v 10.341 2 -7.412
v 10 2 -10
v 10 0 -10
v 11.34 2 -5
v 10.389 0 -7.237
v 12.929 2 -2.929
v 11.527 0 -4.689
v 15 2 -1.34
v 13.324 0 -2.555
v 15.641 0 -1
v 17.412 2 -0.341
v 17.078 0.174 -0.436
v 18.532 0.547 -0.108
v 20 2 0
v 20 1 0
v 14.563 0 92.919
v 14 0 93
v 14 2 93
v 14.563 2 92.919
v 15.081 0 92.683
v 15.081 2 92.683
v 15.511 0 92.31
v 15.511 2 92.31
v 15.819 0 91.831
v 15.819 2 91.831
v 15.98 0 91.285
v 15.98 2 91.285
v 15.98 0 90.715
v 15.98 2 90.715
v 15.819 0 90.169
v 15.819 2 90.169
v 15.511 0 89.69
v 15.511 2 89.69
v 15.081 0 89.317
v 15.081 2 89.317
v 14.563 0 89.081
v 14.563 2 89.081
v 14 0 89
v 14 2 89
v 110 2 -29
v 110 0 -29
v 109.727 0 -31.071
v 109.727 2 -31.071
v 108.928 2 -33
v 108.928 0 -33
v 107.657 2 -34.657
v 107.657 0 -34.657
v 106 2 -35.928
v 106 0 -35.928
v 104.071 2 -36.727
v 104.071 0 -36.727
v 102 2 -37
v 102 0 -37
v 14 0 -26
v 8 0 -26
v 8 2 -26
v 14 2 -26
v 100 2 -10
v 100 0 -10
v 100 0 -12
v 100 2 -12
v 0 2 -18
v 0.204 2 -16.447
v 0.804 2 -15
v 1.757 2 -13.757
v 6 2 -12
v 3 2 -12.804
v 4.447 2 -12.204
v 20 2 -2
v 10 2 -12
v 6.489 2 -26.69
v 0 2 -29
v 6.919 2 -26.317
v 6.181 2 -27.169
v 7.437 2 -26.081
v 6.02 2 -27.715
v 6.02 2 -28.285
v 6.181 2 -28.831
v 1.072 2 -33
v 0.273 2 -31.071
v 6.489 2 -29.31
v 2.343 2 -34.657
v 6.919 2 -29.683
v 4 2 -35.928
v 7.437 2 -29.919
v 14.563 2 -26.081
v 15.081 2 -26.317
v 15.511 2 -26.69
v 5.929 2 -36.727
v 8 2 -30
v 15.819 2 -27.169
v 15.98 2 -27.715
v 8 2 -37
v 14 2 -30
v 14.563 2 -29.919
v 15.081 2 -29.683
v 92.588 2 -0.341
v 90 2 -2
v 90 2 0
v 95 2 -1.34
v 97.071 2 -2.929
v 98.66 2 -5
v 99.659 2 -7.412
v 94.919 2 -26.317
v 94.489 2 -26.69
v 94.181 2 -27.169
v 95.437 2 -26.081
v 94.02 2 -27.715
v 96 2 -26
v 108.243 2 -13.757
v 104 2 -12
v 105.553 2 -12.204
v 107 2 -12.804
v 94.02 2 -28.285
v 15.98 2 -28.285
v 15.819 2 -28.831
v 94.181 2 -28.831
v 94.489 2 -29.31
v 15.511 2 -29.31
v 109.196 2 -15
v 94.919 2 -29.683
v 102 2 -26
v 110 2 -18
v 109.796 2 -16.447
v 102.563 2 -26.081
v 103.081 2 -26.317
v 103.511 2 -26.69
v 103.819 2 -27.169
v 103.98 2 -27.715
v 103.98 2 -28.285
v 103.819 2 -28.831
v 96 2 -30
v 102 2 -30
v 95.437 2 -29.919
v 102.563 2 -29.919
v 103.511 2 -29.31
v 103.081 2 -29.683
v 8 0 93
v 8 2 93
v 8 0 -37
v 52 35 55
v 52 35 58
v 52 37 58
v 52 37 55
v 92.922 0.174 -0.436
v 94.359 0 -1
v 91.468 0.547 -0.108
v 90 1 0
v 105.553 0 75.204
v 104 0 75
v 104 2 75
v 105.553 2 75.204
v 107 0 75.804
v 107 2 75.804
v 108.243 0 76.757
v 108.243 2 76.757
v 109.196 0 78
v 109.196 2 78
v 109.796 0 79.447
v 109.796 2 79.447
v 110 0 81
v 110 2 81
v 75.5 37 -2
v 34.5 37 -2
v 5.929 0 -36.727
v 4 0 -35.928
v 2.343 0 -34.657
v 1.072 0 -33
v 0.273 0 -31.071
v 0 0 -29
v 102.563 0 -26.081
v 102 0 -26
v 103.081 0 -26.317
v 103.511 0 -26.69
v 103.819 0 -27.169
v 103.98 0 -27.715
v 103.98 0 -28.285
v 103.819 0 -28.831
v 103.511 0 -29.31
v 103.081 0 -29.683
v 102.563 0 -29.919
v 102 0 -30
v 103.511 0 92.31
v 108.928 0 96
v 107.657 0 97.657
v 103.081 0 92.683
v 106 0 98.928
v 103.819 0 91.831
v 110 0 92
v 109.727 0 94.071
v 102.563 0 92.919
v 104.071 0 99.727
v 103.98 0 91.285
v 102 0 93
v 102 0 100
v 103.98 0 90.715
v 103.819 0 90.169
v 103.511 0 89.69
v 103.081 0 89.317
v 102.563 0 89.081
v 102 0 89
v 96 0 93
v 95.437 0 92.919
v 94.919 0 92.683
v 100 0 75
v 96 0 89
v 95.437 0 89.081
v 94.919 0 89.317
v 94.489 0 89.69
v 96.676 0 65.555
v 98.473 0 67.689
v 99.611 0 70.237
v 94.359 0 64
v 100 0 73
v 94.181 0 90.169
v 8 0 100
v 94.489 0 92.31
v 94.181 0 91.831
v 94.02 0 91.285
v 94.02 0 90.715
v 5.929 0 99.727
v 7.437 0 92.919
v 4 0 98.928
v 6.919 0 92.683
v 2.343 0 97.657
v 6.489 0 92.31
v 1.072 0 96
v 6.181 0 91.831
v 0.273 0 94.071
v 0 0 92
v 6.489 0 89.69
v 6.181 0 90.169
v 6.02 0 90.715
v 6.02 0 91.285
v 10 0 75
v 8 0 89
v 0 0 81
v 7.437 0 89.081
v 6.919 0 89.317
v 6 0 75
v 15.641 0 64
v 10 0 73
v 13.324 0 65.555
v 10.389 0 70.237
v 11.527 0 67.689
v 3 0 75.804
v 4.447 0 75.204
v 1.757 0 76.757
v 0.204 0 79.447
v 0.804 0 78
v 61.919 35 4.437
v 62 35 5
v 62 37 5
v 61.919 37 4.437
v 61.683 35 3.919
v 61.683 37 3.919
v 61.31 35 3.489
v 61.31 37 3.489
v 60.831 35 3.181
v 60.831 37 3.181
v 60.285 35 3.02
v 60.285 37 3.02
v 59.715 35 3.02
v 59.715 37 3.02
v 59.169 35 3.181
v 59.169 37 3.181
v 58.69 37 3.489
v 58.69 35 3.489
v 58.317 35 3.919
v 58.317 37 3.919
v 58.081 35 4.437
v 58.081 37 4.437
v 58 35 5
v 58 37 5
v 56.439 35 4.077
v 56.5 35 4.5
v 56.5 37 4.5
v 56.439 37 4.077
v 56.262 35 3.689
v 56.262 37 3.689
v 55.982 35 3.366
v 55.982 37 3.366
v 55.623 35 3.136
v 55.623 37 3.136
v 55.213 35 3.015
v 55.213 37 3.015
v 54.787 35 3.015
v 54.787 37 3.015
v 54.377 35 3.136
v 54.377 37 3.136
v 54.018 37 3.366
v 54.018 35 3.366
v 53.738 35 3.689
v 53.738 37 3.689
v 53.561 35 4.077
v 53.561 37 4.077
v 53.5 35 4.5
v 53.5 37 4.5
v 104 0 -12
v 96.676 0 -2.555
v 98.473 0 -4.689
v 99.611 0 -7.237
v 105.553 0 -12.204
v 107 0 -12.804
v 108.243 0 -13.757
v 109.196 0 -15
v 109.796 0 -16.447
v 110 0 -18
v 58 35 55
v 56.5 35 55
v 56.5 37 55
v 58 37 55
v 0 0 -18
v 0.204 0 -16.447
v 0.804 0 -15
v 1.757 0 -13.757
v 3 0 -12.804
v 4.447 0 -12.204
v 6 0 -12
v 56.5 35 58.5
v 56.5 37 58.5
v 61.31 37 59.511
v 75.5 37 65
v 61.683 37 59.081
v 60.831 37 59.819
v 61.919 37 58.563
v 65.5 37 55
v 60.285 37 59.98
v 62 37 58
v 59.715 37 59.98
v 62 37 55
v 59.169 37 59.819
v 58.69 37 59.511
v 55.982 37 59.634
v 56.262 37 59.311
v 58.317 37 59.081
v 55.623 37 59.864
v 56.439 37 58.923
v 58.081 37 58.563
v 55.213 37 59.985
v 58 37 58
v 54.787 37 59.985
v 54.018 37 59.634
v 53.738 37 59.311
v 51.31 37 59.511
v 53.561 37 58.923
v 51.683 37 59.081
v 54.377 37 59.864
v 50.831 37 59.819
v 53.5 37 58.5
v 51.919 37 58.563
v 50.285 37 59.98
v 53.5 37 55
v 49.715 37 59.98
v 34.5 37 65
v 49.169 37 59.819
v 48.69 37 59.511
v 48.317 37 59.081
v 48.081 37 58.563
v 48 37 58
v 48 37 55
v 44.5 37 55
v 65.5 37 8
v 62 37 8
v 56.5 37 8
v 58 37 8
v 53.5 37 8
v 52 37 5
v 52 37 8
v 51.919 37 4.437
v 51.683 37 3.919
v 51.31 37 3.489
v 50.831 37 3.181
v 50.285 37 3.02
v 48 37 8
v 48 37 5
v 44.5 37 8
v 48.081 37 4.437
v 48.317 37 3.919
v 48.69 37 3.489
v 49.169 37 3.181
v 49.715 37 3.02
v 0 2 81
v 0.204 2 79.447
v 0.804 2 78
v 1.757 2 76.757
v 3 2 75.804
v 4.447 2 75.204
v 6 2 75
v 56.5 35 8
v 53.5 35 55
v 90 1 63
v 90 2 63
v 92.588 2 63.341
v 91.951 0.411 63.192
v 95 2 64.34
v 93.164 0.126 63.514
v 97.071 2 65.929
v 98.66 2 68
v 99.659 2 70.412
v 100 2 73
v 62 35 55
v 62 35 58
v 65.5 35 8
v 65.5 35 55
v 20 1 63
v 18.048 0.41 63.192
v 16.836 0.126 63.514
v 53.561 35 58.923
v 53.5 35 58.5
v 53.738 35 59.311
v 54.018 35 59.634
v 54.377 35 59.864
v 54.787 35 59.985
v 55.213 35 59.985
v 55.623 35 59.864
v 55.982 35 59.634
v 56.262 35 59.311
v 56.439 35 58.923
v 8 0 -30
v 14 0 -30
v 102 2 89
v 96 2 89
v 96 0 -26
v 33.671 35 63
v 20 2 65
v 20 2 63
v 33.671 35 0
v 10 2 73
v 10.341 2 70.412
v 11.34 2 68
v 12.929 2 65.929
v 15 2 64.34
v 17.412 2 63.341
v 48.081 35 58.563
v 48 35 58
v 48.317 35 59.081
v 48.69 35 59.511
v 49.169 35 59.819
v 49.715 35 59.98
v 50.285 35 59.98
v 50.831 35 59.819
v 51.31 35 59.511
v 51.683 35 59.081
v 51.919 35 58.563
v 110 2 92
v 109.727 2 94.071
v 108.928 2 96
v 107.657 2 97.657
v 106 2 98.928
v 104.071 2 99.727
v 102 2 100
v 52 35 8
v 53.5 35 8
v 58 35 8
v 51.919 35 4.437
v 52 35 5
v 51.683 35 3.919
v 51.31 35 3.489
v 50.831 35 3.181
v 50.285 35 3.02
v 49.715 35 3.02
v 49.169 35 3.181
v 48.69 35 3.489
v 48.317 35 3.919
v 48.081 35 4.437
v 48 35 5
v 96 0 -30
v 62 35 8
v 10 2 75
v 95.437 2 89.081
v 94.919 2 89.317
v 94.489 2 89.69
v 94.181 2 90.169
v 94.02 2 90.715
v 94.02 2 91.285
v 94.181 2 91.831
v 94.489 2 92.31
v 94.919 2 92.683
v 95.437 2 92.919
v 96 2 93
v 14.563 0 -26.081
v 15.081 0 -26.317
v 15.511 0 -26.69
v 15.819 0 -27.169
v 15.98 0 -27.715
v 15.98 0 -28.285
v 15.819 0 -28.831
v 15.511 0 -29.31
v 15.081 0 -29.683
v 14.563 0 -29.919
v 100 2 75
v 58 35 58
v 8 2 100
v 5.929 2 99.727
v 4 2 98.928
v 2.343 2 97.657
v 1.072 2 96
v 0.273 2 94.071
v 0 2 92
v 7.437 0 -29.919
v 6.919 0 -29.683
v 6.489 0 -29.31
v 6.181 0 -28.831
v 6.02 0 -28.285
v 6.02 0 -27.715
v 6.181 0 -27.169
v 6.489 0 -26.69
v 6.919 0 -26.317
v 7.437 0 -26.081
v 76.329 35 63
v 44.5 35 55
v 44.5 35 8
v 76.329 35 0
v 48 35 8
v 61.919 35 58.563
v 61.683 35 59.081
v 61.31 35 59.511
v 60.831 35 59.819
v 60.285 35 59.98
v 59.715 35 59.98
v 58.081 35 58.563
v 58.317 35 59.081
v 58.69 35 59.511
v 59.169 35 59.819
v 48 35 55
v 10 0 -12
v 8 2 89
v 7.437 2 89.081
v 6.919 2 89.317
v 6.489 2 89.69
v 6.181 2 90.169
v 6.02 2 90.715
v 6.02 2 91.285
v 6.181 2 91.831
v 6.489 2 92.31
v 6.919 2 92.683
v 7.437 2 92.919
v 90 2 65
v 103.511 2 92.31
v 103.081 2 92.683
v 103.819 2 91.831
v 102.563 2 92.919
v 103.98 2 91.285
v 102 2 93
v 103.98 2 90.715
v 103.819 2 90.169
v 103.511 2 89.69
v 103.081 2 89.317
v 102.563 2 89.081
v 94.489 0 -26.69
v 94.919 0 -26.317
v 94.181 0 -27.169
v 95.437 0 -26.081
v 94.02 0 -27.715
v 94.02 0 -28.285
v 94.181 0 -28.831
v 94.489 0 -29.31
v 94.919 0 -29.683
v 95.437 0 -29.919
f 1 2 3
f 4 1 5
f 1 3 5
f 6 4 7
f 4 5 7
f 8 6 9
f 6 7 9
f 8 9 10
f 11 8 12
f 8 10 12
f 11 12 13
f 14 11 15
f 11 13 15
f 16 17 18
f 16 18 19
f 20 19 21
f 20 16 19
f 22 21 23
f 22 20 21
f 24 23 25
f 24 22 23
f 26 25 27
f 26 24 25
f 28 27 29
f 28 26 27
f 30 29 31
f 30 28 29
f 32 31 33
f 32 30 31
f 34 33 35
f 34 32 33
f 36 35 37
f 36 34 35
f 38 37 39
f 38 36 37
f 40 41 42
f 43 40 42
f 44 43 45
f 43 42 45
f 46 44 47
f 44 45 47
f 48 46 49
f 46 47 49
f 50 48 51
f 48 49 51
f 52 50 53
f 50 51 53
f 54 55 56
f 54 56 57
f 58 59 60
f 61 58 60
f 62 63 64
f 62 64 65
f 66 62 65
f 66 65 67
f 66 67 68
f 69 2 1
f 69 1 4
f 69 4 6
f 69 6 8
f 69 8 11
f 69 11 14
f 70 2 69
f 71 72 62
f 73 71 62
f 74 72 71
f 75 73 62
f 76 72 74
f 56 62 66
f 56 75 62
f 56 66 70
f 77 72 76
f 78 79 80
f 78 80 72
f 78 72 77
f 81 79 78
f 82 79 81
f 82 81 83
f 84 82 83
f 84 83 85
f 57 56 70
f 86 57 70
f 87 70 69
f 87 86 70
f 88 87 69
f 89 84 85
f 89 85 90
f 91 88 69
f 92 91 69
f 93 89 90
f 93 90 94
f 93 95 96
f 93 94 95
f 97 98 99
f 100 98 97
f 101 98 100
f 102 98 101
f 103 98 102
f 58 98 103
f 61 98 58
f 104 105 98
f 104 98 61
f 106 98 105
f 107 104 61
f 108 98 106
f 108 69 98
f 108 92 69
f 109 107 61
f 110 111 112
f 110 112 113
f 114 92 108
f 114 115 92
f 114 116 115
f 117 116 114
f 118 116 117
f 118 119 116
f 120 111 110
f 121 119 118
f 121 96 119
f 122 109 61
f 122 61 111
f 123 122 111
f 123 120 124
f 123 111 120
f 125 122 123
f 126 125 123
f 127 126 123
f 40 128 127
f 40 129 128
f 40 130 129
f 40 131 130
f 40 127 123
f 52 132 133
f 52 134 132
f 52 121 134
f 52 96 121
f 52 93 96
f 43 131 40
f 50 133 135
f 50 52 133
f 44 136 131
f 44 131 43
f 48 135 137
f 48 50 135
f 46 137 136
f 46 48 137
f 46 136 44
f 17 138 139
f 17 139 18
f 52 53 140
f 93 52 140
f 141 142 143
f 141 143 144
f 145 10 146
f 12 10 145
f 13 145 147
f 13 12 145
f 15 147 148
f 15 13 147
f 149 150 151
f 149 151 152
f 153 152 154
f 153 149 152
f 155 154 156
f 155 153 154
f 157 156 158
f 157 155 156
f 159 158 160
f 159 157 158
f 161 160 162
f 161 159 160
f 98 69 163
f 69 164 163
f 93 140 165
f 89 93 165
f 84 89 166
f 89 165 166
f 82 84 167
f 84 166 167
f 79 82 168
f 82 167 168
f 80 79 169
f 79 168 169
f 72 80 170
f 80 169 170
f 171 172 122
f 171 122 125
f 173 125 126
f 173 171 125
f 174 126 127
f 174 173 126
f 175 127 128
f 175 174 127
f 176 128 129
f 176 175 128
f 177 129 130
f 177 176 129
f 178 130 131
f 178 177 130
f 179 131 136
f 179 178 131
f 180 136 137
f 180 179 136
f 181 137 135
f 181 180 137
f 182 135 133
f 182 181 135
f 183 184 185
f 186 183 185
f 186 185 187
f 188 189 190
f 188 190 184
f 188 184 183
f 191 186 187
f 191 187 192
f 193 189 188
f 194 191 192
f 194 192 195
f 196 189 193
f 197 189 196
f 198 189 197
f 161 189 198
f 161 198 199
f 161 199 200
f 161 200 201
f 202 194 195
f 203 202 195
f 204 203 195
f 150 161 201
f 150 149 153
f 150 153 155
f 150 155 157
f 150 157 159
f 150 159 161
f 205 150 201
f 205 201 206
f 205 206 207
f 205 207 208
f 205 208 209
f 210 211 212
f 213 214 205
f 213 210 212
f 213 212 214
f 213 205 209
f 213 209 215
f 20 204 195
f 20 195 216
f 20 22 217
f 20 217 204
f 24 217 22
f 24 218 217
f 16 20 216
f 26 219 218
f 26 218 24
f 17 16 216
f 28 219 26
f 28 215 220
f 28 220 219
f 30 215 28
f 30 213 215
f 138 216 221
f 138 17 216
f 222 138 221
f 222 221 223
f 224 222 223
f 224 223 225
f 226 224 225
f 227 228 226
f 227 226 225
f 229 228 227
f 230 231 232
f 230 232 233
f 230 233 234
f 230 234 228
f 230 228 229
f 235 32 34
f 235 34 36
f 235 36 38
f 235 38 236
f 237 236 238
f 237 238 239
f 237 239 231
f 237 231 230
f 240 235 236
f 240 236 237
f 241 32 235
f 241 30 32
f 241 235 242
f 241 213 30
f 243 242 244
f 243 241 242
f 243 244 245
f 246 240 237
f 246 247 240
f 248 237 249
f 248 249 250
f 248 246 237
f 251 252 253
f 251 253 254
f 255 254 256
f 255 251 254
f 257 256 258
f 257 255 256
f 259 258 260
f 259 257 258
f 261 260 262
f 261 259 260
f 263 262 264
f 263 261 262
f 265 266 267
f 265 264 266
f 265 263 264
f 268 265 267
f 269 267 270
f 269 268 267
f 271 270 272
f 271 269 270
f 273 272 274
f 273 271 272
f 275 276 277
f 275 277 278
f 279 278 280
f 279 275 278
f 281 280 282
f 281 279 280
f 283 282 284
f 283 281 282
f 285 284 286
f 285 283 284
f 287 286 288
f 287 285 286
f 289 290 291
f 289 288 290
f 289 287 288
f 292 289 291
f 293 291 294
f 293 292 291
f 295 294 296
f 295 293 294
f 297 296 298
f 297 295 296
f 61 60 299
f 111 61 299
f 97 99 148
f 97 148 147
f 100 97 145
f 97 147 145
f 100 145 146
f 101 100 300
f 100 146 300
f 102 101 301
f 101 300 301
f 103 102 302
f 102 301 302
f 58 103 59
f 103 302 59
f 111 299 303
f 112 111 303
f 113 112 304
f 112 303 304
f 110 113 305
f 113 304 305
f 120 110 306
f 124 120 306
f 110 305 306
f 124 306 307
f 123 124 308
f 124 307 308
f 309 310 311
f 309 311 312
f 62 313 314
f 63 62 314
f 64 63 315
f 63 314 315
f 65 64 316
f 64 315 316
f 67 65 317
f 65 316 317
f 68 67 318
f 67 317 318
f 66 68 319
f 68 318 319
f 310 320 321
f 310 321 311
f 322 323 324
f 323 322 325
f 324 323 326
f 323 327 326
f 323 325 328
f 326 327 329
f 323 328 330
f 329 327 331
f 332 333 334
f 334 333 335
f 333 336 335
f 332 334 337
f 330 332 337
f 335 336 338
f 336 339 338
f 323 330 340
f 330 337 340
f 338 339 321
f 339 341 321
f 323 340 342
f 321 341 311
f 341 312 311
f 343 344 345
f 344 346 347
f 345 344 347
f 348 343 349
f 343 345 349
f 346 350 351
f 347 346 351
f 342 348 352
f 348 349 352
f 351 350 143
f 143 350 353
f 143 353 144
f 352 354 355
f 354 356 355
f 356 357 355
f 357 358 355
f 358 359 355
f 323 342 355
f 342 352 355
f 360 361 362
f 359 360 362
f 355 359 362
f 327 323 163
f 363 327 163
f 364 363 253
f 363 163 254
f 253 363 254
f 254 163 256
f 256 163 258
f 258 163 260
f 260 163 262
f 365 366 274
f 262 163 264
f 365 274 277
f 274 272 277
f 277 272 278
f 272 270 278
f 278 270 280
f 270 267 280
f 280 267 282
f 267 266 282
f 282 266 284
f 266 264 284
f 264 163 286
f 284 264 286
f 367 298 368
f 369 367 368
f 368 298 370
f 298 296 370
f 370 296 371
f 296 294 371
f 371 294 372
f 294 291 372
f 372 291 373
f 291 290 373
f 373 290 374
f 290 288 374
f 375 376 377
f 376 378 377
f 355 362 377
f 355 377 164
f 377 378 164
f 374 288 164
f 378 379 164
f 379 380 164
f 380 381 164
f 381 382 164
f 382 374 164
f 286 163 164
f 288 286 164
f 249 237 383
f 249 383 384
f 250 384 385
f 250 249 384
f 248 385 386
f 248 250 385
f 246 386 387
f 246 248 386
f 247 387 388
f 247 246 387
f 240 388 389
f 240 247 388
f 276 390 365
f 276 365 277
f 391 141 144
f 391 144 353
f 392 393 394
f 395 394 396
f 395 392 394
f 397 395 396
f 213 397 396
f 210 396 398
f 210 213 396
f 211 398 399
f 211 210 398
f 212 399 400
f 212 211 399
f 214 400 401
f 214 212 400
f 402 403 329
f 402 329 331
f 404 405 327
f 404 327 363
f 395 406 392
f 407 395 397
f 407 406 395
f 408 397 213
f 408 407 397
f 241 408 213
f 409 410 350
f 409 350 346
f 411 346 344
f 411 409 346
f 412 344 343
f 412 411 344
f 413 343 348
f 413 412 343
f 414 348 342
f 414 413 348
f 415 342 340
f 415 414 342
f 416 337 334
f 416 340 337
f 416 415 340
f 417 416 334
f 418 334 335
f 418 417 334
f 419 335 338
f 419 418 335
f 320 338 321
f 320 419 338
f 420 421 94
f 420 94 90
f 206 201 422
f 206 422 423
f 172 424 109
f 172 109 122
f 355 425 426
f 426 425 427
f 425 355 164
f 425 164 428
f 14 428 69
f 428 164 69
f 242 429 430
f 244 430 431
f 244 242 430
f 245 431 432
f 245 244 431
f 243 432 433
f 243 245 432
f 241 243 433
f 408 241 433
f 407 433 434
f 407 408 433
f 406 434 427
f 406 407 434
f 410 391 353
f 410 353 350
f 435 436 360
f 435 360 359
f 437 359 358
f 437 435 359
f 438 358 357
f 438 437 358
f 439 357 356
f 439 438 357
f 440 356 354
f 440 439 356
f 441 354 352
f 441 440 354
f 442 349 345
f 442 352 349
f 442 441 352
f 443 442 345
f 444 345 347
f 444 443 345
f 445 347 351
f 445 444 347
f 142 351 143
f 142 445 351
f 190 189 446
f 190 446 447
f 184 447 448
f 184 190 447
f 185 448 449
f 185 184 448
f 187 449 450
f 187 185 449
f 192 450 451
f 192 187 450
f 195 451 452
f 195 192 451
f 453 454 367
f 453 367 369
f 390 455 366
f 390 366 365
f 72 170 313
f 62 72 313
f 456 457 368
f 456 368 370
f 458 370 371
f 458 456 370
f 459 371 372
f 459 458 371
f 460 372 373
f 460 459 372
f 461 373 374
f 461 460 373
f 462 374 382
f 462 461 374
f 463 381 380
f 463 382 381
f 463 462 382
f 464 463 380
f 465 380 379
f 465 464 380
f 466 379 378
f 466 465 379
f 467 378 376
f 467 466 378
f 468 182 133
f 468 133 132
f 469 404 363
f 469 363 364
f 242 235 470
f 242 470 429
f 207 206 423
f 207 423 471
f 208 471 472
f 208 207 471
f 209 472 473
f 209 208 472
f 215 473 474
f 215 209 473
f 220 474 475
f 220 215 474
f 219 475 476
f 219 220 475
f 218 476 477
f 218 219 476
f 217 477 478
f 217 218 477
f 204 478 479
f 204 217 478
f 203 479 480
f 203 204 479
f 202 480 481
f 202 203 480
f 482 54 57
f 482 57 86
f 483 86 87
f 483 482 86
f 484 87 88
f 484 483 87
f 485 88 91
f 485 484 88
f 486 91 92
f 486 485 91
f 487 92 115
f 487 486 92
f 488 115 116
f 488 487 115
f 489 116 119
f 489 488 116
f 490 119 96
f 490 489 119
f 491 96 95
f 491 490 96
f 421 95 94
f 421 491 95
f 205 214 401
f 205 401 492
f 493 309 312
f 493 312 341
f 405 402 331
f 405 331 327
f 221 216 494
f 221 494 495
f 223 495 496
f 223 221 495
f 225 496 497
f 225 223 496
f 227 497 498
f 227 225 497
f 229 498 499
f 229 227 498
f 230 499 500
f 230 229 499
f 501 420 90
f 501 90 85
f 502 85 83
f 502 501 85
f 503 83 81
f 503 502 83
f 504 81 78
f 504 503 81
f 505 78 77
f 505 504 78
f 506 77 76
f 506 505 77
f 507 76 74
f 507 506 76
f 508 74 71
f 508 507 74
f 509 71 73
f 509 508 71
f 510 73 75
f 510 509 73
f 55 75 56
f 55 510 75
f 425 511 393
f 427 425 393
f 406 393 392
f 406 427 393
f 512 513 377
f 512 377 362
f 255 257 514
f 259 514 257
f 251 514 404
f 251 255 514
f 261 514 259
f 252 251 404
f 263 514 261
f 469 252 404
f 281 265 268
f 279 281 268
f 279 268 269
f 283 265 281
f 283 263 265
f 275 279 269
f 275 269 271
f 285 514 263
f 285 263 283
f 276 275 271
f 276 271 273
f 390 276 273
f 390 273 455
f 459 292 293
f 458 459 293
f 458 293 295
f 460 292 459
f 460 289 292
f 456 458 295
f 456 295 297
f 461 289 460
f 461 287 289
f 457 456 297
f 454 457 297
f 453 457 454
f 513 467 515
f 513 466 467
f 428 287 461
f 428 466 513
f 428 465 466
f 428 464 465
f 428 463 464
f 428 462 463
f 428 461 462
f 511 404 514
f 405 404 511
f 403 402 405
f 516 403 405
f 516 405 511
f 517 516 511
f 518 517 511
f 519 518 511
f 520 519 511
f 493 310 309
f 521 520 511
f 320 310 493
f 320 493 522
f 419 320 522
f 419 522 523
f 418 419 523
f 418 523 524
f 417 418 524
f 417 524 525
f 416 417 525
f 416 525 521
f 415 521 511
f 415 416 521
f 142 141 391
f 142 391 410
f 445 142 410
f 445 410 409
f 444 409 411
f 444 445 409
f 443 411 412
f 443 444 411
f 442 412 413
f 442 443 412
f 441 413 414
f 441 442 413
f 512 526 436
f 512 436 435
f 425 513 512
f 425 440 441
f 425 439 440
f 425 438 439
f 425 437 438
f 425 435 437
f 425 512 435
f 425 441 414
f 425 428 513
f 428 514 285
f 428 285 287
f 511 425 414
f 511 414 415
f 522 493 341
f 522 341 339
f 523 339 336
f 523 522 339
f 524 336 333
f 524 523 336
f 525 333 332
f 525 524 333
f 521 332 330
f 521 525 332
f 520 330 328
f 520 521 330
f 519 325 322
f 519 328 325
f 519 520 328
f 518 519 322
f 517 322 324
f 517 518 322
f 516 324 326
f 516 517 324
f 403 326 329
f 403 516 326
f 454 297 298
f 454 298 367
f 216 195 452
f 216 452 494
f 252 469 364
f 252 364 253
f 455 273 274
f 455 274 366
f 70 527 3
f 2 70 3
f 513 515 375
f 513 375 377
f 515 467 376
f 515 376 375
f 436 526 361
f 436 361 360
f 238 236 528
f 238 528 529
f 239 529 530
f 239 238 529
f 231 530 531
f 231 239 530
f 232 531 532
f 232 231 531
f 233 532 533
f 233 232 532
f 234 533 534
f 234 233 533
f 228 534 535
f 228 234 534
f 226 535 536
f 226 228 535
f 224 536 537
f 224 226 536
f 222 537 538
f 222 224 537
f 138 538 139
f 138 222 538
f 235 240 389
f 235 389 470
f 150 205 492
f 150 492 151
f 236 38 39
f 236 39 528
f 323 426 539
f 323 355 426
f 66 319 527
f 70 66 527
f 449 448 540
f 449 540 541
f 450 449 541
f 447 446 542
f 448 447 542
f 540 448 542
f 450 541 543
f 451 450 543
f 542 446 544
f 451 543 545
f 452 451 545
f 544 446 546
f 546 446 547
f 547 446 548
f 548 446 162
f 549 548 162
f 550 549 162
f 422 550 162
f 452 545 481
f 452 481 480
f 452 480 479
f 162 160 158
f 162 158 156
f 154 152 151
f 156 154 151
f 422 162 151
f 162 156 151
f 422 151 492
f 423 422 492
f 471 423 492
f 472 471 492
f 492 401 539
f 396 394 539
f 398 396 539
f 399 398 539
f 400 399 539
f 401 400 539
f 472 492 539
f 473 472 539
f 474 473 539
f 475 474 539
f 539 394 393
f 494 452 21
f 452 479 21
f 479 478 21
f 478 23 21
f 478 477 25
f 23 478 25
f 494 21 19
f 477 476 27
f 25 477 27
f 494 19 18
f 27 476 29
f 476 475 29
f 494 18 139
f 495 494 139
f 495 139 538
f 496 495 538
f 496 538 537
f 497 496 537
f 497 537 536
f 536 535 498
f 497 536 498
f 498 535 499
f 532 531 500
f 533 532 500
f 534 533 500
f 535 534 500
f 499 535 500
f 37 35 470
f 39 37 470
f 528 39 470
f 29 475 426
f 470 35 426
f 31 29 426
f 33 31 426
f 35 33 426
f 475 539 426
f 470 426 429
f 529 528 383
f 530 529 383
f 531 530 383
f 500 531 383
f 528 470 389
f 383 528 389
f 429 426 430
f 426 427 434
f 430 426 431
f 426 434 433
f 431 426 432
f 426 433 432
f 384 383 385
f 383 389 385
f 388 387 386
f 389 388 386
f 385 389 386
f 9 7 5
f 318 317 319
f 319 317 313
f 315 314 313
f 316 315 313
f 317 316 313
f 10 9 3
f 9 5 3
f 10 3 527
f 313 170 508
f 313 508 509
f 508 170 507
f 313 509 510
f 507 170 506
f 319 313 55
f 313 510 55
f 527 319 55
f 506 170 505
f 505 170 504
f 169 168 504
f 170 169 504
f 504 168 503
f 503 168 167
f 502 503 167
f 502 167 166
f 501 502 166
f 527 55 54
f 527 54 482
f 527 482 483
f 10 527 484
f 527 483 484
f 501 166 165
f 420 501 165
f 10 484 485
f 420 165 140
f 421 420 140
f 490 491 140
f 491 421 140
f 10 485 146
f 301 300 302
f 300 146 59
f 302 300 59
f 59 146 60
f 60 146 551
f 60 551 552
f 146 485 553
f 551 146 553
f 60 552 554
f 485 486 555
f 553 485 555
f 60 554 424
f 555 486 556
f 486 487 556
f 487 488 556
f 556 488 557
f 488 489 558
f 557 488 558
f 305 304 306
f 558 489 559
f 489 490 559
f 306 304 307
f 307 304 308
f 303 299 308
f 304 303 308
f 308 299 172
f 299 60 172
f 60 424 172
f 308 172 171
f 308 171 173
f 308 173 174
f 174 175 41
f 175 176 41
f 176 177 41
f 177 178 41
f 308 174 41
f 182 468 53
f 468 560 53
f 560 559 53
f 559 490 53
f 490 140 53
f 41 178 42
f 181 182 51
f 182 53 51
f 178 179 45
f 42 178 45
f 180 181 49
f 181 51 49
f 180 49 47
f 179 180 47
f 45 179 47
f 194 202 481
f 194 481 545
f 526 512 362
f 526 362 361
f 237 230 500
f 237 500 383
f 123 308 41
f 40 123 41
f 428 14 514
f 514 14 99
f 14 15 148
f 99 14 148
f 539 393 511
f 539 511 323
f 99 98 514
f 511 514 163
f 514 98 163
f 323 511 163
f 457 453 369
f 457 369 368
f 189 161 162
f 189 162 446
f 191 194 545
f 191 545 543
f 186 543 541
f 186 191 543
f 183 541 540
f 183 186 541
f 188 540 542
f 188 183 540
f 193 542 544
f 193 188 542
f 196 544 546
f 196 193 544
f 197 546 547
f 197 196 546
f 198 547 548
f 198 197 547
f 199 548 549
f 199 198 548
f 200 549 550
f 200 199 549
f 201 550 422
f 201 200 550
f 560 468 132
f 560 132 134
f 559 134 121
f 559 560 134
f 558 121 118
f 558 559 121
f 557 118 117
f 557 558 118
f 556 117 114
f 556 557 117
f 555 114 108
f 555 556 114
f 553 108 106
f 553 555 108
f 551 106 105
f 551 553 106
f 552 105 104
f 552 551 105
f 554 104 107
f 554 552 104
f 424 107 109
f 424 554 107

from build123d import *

# Parameters (mm, degrees)
EXTRUDE_1_DEPTH          = 2
EXTRUDE_1_2_DEPTH        = 2
EXTRUDE_3_DEPTH          = 33.5
EXTRUDE_3_DEPTH_BACK     = 33.5
CUT_EXTRUDE_3_DEPTH      = 154.195952949
CUT_EXTRUDE_3_DEPTH_BACK = 33.5
CUT_EXTRUDE_6_DEPTH      = 154.195952949


with BuildPart() as part:
    # 草图1 → 凸台-拉伸1 (new body)
    with BuildSketch(Plane(origin=(0, 0, 0), x_dir=(1, 0, 0), z_dir=(0, 1, 0))):
        with BuildLine():
            Line((0, 29), (0, 18))
            ThreePointArc((0, 18), (1.757359313, 13.757359313), (6, 12))
            Line((6, 12), (10, 12))
            Line((10, 12), (10, 10))
            ThreePointArc((10, 10), (12.928932188, 2.928932188), (20, 0))
            Line((20, 0), (90, 0))
            ThreePointArc((90, 0), (97.071067812, 2.928932188), (100, 10))
            Line((100, 10), (100, 12))
            Line((100, 12), (104, 12))
            ThreePointArc((104, 12), (108.242640687, 13.757359313), (110, 18))
            Line((110, 18), (110, 29))
            ThreePointArc((110, 29), (107.656854249, 34.656854249), (102, 37))
            Line((102, 37), (8, 37))
            ThreePointArc((8, 37), (2.343145751, 34.656854249), (0, 29))
        make_face()
        with BuildLine():
            Line((102, 30), (96, 30))
            ThreePointArc((96, 30), (94, 28), (96, 26))
            Line((96, 26), (102, 26))
            ThreePointArc((102, 26), (104, 28), (102, 30))
        make_face(mode=Mode.SUBTRACT)
        with BuildLine():
            Line((8, 26), (14, 26))
            ThreePointArc((14, 26), (16, 28), (14, 30))
            Line((14, 30), (8, 30))
            ThreePointArc((8, 30), (6, 28), (8, 26))
        make_face(mode=Mode.SUBTRACT)
    extrude(amount=EXTRUDE_1_DEPTH)



with BuildPart() as body_2:
    # 草图1 → Extrude 1 2 (new body)
    with BuildSketch(Plane(origin=(0, 0, 0), x_dir=(1, 0, 0), z_dir=(0, 1, 0))):
        with BuildLine():
            Line((100, -75), (104, -75))
            ThreePointArc((104, -75), (108.242640687, -76.757359313), (110, -81))
            Line((110, -81), (110, -92))
            ThreePointArc((110, -92), (107.656854249, -97.656854249), (102, -100))
            Line((102, -100), (8, -100))
            ThreePointArc((8, -100), (2.343145751, -97.656854249), (0, -92))
            Line((0, -92), (0, -81))
            ThreePointArc((0, -81), (1.757359313, -76.757359313), (6, -75))
            Line((6, -75), (10, -75))
            Line((10, -75), (10, -73))
            ThreePointArc((10, -73), (12.928932188, -65.928932188), (20, -63))
            Line((20, -63), (90, -63))
            ThreePointArc((90, -63), (97.071067812, -65.928932188), (100, -73))
            Line((100, -73), (100, -75))
        make_face()
        with BuildLine():
            Line((8, -93), (14, -93))
            ThreePointArc((14, -93), (16, -91), (14, -89))
            Line((14, -89), (8, -89))
            ThreePointArc((8, -89), (6, -91), (8, -93))
        make_face(mode=Mode.SUBTRACT)
        with BuildLine():
            Line((102, -89), (96, -89))
            ThreePointArc((96, -89), (94, -91), (96, -93))
            Line((96, -93), (102, -93))
            ThreePointArc((102, -93), (104, -91), (102, -89))
        make_face(mode=Mode.SUBTRACT)
    extrude(amount=EXTRUDE_1_2_DEPTH)


with BuildPart() as part_1:
    add(part.part)

    add(body_2.part)  # 凸台-拉伸3 merges body 2
    # 草图2 → 凸台-拉伸3 (add, two sides: drawn at the far end of the back side and taken through both)
    with BuildSketch(Plane.XY.offset(31.5).offset(-EXTRUDE_3_DEPTH_BACK)):
        Polygon((20, 2), (90, 2), (75.5, 37), (55, 37), (34.5, 37), align=None)
    extrude(amount=EXTRUDE_3_DEPTH + EXTRUDE_3_DEPTH_BACK)

    # 草图3 → 切除-拉伸3 (cut, two sides: drawn at the far end of the back side and taken through both)
    with BuildSketch(Plane(origin=(0, 0, 0), x_dir=(0, 0, -1), z_dir=(1, 0, 0)).offset(-CUT_EXTRUDE_3_DEPTH_BACK)):
        with BuildLine():
            Line((-63, 2), (-63, 1))
            ThreePointArc((-63, 1), (-63.292893219, 0.292893219), (-64, 0))
            Line((-64, 0), (1, 0))
            ThreePointArc((1, 0), (0.292893219, 0.292893219), (0, 1))
            Line((0, 1), (0, 2))
            Line((0, 2), (0, 35))
            Line((0, 35), (-63, 35))
            Line((-63, 35), (-63, 2))
        make_face()
    extrude(amount=CUT_EXTRUDE_3_DEPTH + CUT_EXTRUDE_3_DEPTH_BACK, mode=Mode.SUBTRACT)

    # 草图4 → 切除-拉伸6 (cut, through all)
    with BuildSketch(Plane(origin=(0, 0, 0), x_dir=(1, 0, 0), z_dir=(0, 1, 0))):
        with BuildLine():
            Line((48, -8), (44.5, -8))
            Line((44.5, -8), (44.5, -55))
            Line((44.5, -55), (48, -55))
            Line((48, -55), (48, -58))
            ThreePointArc((48, -58), (50, -60), (52, -58))
            Line((52, -58), (52, -55))
            Line((52, -55), (53.5, -55))
            Line((53.5, -55), (53.5, -58.5))
            ThreePointArc((53.5, -58.5), (55, -60), (56.5, -58.5))
            Line((56.5, -58.5), (56.5, -55))
            Line((56.5, -55), (58, -55))
            Line((58, -55), (58, -58))
            ThreePointArc((58, -58), (60, -60), (62, -58))
            Line((62, -58), (62, -55))
            Line((62, -55), (65.5, -55))
            Line((65.5, -55), (65.5, -8))
            Line((65.5, -8), (62, -8))
            Line((62, -8), (62, -5))
            ThreePointArc((62, -5), (60, -3), (58, -5))
            Line((58, -5), (58, -8))
            Line((58, -8), (56.5, -8))
            Line((56.5, -8), (56.5, -4.5))
            ThreePointArc((56.5, -4.5), (55, -3), (53.5, -4.5))
            Line((53.5, -4.5), (53.5, -8))
            Line((53.5, -8), (52, -8))
            Line((52, -8), (52, -5))
            ThreePointArc((52, -5), (50, -3), (48, -5))
            Line((48, -5), (48, -8))
        make_face()
    extrude(amount=CUT_EXTRUDE_6_DEPTH, mode=Mode.SUBTRACT)


solid = part_1.part
